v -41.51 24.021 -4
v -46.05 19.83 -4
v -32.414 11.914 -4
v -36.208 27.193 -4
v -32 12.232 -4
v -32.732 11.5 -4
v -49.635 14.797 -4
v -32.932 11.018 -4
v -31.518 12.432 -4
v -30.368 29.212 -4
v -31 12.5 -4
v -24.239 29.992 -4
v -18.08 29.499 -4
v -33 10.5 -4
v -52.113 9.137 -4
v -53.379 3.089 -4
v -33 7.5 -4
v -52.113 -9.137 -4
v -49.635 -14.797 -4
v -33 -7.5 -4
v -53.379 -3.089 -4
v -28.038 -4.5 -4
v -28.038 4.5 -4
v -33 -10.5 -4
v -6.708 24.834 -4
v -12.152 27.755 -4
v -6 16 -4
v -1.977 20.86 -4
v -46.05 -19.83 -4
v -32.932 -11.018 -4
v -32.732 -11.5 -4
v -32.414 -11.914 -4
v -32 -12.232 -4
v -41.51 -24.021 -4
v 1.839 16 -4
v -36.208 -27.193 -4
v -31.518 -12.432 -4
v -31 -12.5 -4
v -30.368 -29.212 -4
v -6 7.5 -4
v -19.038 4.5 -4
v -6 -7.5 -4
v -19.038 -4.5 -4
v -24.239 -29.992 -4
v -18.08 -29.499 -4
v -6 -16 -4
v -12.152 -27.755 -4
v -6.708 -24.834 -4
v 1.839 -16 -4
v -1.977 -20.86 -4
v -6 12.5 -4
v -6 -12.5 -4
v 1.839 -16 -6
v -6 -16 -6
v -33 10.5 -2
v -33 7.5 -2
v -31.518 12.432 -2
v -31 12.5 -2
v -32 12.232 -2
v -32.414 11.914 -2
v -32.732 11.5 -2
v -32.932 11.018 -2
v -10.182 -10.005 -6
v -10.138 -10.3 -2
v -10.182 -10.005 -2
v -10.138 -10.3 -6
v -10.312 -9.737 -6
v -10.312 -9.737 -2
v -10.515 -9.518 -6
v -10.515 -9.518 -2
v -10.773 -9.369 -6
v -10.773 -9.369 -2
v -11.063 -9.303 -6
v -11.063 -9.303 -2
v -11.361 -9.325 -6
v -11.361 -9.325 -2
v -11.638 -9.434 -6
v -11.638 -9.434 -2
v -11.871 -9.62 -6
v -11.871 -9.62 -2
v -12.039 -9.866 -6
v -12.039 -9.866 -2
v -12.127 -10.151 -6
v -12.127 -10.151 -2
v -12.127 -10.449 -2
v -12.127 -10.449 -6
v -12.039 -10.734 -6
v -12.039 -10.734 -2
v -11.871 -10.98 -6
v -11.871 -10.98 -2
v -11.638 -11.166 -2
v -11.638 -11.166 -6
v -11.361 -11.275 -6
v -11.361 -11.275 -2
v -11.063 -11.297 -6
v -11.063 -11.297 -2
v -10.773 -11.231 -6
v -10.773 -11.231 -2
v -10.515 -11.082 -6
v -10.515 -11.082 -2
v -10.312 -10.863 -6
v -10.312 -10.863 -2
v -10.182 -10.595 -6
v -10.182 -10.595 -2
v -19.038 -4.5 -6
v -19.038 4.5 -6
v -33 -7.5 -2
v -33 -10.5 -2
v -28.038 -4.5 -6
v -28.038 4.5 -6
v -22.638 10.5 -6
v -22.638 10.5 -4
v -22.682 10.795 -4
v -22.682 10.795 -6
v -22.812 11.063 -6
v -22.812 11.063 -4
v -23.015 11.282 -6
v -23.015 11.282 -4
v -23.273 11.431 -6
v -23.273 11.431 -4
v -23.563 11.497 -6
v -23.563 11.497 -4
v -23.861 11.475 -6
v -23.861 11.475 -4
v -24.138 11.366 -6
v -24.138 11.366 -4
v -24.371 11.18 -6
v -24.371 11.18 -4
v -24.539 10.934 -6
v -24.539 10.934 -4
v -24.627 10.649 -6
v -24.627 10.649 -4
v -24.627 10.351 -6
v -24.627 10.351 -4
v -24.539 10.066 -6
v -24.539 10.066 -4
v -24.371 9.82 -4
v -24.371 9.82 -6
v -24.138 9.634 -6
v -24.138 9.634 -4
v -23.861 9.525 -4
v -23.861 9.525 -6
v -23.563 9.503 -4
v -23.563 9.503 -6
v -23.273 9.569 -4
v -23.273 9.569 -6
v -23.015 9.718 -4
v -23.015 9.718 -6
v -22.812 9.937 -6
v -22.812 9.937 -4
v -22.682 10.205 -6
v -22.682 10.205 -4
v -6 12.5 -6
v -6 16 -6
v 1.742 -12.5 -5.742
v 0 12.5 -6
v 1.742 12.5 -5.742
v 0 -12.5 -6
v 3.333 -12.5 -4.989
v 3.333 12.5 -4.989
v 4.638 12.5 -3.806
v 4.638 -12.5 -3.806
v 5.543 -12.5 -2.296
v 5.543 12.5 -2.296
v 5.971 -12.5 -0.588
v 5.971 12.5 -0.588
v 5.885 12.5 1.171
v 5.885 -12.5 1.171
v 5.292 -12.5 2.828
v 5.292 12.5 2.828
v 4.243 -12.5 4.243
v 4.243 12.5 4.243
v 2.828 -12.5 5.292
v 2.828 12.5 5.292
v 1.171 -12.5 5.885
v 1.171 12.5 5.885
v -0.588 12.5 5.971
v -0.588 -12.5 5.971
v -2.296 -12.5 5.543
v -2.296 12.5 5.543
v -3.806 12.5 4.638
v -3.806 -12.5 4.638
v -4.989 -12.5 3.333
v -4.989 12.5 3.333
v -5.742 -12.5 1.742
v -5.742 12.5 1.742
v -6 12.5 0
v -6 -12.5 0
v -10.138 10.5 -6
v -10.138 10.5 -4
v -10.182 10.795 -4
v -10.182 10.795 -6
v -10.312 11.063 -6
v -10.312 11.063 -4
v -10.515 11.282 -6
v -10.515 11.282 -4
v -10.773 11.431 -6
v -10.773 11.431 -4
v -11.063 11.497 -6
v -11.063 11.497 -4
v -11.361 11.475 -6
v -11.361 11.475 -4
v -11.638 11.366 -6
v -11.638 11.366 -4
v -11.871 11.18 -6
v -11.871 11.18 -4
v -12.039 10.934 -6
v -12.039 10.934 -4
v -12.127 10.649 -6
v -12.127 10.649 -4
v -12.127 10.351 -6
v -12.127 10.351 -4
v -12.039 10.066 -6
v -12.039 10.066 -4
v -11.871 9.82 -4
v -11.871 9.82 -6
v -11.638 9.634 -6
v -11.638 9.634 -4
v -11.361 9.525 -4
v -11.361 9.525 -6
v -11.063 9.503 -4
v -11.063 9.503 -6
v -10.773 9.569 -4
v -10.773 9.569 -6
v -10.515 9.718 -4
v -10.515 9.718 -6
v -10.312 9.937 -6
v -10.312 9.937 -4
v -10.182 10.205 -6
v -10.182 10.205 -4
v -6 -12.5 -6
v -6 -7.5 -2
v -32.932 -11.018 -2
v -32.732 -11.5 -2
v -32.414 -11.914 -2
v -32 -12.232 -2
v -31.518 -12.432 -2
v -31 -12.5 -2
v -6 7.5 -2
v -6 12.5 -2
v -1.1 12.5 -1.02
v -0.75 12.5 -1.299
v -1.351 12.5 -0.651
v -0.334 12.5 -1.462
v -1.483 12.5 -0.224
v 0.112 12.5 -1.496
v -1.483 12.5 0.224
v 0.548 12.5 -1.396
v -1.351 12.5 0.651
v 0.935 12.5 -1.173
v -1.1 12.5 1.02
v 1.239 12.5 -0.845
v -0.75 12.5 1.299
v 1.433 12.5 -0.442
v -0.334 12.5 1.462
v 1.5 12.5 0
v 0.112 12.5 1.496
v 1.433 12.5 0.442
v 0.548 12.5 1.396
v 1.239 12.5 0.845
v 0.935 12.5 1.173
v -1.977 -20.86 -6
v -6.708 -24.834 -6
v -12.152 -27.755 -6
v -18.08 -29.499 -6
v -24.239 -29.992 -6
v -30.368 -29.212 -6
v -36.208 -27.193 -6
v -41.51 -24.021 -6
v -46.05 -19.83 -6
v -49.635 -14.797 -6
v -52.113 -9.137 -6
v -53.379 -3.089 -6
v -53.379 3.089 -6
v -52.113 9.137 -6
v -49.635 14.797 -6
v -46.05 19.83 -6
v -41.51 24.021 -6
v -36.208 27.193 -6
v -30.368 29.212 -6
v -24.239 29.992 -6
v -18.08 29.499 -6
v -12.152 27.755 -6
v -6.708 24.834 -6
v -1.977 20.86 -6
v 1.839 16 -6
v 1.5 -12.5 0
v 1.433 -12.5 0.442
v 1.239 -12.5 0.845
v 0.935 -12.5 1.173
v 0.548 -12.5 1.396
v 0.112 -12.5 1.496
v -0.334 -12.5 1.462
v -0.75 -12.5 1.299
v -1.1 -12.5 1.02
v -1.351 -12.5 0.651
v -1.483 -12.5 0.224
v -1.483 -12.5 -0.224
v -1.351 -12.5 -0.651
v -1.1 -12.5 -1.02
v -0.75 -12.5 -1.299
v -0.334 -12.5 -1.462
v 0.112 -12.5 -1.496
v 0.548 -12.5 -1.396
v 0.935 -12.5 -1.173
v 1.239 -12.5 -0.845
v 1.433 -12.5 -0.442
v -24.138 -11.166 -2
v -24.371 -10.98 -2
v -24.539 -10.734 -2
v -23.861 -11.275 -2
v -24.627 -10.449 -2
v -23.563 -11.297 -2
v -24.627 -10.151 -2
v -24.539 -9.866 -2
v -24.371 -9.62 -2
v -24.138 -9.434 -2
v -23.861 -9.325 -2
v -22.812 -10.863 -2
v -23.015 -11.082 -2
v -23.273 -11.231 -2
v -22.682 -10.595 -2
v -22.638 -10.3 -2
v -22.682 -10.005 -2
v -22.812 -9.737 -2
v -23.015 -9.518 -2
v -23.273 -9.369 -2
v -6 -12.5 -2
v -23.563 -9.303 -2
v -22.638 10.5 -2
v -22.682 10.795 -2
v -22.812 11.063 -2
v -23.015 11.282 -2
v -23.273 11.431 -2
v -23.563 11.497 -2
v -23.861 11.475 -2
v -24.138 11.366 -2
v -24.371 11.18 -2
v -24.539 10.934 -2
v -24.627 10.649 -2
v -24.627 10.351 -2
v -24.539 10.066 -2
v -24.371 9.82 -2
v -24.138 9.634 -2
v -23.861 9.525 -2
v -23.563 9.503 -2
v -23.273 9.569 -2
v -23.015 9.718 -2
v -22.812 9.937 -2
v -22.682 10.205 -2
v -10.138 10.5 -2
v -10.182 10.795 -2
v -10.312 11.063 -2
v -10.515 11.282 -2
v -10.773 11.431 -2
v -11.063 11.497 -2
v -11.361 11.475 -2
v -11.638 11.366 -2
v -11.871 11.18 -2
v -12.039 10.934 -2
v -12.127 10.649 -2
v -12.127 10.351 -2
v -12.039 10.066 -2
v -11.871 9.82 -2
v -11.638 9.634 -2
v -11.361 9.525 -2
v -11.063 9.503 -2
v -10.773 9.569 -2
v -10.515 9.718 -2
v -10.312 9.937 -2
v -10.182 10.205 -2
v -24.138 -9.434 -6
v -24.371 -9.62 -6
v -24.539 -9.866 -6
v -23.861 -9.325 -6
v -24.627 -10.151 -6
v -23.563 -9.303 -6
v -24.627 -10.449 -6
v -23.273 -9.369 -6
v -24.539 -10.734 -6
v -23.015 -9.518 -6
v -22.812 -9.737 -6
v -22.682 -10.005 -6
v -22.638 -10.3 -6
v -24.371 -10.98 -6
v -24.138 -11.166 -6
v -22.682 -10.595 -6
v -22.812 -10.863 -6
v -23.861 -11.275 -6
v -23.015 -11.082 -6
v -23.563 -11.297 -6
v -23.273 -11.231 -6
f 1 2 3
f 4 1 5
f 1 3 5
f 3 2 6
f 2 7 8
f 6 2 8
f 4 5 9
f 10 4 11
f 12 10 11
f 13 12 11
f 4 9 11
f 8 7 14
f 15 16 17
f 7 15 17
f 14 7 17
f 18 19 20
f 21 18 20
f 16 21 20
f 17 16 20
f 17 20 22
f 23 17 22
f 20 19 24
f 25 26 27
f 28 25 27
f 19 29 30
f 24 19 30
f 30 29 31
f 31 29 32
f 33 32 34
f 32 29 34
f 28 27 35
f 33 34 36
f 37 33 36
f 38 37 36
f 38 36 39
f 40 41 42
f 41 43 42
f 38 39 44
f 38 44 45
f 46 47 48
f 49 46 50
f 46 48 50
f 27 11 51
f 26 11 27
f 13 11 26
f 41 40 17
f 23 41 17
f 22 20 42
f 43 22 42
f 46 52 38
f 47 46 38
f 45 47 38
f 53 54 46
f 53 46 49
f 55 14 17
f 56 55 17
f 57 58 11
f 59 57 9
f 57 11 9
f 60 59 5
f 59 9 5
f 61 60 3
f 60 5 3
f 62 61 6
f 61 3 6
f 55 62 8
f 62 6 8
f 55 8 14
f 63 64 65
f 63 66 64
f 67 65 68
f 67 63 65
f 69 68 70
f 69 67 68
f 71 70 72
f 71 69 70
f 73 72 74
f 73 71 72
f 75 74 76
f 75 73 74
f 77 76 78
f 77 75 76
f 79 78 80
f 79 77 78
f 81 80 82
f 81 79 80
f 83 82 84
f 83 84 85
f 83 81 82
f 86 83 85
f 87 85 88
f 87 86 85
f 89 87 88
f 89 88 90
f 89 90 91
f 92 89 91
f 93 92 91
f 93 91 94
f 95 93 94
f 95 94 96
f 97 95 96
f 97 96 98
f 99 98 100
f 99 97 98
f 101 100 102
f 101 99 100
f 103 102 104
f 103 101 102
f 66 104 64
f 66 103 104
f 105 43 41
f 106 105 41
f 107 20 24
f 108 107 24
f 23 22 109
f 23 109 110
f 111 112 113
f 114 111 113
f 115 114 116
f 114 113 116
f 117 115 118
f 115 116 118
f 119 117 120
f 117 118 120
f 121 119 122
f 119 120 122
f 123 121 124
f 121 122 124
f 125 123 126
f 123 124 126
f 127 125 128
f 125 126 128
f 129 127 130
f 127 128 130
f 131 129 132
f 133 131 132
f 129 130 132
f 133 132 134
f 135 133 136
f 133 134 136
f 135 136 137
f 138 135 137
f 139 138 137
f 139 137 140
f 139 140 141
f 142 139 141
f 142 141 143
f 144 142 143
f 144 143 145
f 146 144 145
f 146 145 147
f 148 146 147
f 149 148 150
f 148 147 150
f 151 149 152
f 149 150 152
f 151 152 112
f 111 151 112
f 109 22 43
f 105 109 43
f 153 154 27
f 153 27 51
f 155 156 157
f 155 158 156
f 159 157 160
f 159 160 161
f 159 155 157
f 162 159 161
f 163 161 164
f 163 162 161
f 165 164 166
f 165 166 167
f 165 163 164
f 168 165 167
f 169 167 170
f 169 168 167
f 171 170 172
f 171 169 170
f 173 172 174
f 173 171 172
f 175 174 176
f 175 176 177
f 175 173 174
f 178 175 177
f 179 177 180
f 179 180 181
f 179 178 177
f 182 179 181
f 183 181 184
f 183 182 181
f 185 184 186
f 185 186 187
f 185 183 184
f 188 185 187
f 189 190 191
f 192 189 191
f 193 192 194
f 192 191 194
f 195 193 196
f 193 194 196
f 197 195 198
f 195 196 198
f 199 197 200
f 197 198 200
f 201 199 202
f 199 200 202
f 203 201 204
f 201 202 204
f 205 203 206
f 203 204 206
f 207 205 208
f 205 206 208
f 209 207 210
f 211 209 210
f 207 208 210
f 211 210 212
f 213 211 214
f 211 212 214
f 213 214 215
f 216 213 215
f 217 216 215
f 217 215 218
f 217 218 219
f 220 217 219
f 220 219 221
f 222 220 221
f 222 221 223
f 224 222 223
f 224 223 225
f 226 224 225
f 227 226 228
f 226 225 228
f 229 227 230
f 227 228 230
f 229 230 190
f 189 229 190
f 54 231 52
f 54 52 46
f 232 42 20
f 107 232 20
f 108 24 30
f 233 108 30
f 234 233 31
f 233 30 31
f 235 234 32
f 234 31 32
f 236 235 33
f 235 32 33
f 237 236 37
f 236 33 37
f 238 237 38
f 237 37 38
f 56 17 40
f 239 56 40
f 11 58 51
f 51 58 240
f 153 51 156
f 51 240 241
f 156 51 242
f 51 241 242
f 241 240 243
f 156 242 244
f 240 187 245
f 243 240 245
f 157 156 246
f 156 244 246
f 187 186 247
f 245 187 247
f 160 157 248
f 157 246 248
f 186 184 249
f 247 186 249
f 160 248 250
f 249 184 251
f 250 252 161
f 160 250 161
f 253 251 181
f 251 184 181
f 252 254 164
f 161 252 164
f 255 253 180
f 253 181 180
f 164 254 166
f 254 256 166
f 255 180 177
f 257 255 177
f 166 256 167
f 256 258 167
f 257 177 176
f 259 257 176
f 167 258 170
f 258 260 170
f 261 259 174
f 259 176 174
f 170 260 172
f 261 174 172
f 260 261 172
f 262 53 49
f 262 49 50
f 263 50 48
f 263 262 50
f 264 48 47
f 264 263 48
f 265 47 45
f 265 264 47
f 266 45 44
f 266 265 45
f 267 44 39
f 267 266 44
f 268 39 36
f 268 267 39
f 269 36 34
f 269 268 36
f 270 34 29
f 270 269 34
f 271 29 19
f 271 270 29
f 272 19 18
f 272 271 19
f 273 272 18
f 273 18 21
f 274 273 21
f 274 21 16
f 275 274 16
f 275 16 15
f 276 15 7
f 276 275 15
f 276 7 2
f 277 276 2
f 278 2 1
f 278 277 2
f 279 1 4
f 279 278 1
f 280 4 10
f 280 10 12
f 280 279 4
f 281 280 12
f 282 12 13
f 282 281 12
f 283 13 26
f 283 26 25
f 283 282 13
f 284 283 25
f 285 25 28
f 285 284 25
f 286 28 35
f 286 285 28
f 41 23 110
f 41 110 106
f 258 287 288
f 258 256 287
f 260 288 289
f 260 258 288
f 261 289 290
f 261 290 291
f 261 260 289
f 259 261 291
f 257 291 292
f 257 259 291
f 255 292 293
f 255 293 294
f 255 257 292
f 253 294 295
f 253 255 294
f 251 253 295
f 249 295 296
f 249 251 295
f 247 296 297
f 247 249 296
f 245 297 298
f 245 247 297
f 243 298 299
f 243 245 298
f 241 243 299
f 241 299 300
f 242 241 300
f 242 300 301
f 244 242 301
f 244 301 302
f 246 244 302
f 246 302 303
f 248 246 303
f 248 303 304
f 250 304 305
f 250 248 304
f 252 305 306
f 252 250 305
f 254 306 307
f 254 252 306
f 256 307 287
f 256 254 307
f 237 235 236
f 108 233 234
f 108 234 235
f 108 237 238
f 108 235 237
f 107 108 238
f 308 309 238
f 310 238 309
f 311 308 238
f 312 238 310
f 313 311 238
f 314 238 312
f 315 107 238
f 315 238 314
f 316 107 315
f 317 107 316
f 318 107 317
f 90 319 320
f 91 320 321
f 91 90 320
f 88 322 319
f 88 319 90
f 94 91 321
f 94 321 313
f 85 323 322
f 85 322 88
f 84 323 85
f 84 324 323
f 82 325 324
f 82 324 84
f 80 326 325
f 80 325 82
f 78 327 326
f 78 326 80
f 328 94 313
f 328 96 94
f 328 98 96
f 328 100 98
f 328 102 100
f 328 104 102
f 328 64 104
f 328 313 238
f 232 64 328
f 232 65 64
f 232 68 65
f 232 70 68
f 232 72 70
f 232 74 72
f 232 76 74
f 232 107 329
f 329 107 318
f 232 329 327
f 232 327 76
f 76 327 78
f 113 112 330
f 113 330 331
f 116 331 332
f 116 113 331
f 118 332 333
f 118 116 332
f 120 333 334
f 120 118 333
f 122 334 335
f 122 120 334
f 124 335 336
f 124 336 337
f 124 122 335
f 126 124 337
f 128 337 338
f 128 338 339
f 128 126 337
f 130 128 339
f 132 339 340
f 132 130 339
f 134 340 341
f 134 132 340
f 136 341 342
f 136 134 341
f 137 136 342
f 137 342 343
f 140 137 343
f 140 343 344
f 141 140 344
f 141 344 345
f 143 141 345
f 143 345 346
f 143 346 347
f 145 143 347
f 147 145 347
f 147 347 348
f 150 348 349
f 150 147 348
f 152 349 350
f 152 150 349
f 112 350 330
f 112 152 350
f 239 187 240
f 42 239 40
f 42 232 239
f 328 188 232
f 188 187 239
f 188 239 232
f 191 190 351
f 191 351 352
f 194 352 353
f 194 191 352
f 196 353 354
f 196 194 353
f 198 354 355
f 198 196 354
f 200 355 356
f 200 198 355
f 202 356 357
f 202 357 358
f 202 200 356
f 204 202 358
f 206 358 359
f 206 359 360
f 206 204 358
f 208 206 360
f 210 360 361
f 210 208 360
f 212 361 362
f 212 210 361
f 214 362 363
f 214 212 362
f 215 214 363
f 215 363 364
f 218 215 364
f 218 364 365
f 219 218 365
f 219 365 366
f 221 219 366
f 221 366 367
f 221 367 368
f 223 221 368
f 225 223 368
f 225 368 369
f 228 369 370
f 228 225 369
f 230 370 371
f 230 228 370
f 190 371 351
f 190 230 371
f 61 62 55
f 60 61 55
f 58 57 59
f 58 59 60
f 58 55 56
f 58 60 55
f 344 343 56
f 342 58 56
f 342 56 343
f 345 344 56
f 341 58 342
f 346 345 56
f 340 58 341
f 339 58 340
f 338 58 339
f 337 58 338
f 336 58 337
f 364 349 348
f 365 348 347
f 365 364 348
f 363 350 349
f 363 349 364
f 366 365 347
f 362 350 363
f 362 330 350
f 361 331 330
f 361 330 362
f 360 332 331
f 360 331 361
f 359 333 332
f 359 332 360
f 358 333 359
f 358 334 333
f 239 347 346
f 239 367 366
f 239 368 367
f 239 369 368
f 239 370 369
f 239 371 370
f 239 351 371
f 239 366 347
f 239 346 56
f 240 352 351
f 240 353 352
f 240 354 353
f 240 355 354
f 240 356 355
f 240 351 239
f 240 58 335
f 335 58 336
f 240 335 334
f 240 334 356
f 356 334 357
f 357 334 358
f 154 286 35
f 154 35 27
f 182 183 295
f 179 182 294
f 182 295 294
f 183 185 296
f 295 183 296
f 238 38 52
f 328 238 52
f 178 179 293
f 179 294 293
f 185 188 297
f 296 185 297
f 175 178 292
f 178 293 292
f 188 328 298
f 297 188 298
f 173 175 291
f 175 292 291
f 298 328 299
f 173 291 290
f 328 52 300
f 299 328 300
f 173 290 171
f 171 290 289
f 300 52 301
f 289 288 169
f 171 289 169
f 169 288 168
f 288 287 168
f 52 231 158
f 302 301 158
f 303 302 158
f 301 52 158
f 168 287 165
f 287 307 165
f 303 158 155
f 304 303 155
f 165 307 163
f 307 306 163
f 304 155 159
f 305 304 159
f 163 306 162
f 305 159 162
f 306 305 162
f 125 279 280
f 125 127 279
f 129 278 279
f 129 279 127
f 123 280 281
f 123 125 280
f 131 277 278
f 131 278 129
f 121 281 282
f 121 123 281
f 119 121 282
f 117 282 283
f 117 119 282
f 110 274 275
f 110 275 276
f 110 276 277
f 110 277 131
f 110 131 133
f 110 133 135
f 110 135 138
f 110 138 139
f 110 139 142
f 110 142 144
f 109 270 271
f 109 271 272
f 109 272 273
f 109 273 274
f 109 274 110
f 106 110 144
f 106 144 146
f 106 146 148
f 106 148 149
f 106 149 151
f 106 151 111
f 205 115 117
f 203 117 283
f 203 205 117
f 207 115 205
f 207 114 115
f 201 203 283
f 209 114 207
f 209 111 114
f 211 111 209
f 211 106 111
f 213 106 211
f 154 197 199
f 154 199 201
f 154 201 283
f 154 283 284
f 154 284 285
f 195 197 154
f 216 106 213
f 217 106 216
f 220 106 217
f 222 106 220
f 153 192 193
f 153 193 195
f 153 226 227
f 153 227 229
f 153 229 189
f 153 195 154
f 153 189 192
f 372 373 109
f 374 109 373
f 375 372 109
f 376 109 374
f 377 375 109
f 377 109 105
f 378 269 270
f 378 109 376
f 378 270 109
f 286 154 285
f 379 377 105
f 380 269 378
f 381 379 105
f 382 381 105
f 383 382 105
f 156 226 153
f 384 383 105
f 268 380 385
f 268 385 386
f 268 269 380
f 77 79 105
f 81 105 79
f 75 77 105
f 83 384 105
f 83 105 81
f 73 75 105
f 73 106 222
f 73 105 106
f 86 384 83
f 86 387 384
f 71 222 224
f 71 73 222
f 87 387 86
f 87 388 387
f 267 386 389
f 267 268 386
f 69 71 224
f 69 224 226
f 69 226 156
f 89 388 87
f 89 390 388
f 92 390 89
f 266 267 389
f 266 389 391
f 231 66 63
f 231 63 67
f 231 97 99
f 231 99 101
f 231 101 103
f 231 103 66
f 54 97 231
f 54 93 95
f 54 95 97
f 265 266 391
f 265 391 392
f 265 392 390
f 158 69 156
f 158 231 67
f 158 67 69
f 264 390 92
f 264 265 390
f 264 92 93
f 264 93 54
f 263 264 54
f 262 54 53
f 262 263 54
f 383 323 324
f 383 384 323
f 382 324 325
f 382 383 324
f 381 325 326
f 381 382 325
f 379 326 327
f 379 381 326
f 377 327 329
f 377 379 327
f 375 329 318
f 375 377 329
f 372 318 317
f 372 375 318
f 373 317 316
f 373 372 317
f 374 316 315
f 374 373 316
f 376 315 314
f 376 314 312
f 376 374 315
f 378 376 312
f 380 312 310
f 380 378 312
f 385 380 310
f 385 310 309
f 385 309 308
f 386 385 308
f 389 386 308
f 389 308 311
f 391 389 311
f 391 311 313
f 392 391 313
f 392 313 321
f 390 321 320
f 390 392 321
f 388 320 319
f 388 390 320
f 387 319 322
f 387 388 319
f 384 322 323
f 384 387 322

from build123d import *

# Parameters (mm, degrees)
F0_R     = 1.5
F1_DEPTH = 12.5
F2_R     = 2
F3_R     = 1
F3_W     = 9
F3_H     = 9
F4_DEPTH = 2
F5_R     = 1
F6_DEPTH = 2
F8_DEPTH = 2


with BuildPart() as f1:
    # F0 (on Front) → F1 (new body, symmetric)
    with BuildSketch(Plane.XZ):
        with BuildLine():
            ThreePointArc((0, -6), (4.2426406871, 4.2426406871), (-6, 0))
            Line((-6, 0), (-6, -4))
            Line((-6, -4), (-33, -4))
            Line((-33, -4), (-33, -6))
            Line((-33, -6), (0, -6))
        make_face()
        Circle(F0_R, mode=Mode.SUBTRACT)
    extrude(amount=F1_DEPTH, both=True)

    # F2
    f2_edges = [f1.edges().sort_by_distance(p)[0] for p in [
        (-33, -12.5, -5),
        (-33, 12.5, -5),
    ]]
    fillet(f2_edges, radius=F2_R)

    # F3 (on face) → F4 (cut, through all)
    with BuildSketch(Plane.XY.offset(-4)):
        with Locations((-23.638, 10.5)):
            Circle(F3_R)
        with Locations((-11.138, 10.5)):
            Circle(F3_R)
        with Locations((-11.138, -10.3)):
            Circle(F3_R)
        with Locations((-23.638, -10.3)):
            Circle(F3_R)
        with Locations((-23.538, 0)):
            Rectangle(F3_W, F3_H)
    extrude(amount=-F4_DEPTH, mode=Mode.SUBTRACT)

    # F5 (on face) → F6 (join)
    with BuildSketch(Plane.XY.offset(-4)):
        with BuildLine():
            Line((-6, -12.5), (-6, -7.5))
            Line((-6, -7.5), (-33, -7.5))
            Line((-33, -7.5), (-33, -10.5))
            ThreePointArc((-33, -10.5), (-32.4142135624, -11.9142135624), (-31, -12.5))
            Line((-31, -12.5), (-6, -12.5))
        make_face()
        with Locations((-23.638, -10.3)):
            Circle(F5_R, mode=Mode.SUBTRACT)
        with Locations((-11.138, -10.3)):
            Circle(F5_R, mode=Mode.SUBTRACT)
        with BuildLine():
            Line((-33, 7.5), (-6, 7.5))
            Line((-6, 7.5), (-6, 12.5))
            Line((-6, 12.5), (-31, 12.5))
            ThreePointArc((-31, 12.5), (-32.4142135624, 11.9142135624), (-33, 10.5))
            Line((-33, 10.5), (-33, 7.5))
        make_face()
        with Locations((-23.638, 10.5)):
            Circle(F5_R, mode=Mode.SUBTRACT)
        with Locations((-11.138, 10.5)):
            Circle(F5_R, mode=Mode.SUBTRACT)
    extrude(amount=F6_DEPTH)

    # F7 (on face) → F8 (join, through all)
    with BuildSketch(Plane(origin=(0, 0, -6), x_dir=(1, 0, 0), z_dir=(0, 0, -1))):
        with BuildLine():
            Line((-6, 16), (1.8391550809, 16))
            ThreePointArc((1.8391550809, 16), (-53.538, 0), (1.8391550809, -16))
            Line((1.8391550809, -16), (-6, -16))
            Line((-6, -16), (-6, -12.5))
            Line((-6, -12.5), (-31, -12.5))
            ThreePointArc((-31, -12.5), (-32.4142135624, -11.9142135624), (-33, -10.5))
            Line((-33, -10.5), (-33, 10.5))
            ThreePointArc((-33, 10.5), (-32.4142135624, 11.9142135624), (-31, 12.5))
            Line((-31, 12.5), (-6, 12.5))
            Line((-6, 12.5), (-6, 16))
        make_face()
    extrude(amount=-F8_DEPTH)


solid = f1.part
